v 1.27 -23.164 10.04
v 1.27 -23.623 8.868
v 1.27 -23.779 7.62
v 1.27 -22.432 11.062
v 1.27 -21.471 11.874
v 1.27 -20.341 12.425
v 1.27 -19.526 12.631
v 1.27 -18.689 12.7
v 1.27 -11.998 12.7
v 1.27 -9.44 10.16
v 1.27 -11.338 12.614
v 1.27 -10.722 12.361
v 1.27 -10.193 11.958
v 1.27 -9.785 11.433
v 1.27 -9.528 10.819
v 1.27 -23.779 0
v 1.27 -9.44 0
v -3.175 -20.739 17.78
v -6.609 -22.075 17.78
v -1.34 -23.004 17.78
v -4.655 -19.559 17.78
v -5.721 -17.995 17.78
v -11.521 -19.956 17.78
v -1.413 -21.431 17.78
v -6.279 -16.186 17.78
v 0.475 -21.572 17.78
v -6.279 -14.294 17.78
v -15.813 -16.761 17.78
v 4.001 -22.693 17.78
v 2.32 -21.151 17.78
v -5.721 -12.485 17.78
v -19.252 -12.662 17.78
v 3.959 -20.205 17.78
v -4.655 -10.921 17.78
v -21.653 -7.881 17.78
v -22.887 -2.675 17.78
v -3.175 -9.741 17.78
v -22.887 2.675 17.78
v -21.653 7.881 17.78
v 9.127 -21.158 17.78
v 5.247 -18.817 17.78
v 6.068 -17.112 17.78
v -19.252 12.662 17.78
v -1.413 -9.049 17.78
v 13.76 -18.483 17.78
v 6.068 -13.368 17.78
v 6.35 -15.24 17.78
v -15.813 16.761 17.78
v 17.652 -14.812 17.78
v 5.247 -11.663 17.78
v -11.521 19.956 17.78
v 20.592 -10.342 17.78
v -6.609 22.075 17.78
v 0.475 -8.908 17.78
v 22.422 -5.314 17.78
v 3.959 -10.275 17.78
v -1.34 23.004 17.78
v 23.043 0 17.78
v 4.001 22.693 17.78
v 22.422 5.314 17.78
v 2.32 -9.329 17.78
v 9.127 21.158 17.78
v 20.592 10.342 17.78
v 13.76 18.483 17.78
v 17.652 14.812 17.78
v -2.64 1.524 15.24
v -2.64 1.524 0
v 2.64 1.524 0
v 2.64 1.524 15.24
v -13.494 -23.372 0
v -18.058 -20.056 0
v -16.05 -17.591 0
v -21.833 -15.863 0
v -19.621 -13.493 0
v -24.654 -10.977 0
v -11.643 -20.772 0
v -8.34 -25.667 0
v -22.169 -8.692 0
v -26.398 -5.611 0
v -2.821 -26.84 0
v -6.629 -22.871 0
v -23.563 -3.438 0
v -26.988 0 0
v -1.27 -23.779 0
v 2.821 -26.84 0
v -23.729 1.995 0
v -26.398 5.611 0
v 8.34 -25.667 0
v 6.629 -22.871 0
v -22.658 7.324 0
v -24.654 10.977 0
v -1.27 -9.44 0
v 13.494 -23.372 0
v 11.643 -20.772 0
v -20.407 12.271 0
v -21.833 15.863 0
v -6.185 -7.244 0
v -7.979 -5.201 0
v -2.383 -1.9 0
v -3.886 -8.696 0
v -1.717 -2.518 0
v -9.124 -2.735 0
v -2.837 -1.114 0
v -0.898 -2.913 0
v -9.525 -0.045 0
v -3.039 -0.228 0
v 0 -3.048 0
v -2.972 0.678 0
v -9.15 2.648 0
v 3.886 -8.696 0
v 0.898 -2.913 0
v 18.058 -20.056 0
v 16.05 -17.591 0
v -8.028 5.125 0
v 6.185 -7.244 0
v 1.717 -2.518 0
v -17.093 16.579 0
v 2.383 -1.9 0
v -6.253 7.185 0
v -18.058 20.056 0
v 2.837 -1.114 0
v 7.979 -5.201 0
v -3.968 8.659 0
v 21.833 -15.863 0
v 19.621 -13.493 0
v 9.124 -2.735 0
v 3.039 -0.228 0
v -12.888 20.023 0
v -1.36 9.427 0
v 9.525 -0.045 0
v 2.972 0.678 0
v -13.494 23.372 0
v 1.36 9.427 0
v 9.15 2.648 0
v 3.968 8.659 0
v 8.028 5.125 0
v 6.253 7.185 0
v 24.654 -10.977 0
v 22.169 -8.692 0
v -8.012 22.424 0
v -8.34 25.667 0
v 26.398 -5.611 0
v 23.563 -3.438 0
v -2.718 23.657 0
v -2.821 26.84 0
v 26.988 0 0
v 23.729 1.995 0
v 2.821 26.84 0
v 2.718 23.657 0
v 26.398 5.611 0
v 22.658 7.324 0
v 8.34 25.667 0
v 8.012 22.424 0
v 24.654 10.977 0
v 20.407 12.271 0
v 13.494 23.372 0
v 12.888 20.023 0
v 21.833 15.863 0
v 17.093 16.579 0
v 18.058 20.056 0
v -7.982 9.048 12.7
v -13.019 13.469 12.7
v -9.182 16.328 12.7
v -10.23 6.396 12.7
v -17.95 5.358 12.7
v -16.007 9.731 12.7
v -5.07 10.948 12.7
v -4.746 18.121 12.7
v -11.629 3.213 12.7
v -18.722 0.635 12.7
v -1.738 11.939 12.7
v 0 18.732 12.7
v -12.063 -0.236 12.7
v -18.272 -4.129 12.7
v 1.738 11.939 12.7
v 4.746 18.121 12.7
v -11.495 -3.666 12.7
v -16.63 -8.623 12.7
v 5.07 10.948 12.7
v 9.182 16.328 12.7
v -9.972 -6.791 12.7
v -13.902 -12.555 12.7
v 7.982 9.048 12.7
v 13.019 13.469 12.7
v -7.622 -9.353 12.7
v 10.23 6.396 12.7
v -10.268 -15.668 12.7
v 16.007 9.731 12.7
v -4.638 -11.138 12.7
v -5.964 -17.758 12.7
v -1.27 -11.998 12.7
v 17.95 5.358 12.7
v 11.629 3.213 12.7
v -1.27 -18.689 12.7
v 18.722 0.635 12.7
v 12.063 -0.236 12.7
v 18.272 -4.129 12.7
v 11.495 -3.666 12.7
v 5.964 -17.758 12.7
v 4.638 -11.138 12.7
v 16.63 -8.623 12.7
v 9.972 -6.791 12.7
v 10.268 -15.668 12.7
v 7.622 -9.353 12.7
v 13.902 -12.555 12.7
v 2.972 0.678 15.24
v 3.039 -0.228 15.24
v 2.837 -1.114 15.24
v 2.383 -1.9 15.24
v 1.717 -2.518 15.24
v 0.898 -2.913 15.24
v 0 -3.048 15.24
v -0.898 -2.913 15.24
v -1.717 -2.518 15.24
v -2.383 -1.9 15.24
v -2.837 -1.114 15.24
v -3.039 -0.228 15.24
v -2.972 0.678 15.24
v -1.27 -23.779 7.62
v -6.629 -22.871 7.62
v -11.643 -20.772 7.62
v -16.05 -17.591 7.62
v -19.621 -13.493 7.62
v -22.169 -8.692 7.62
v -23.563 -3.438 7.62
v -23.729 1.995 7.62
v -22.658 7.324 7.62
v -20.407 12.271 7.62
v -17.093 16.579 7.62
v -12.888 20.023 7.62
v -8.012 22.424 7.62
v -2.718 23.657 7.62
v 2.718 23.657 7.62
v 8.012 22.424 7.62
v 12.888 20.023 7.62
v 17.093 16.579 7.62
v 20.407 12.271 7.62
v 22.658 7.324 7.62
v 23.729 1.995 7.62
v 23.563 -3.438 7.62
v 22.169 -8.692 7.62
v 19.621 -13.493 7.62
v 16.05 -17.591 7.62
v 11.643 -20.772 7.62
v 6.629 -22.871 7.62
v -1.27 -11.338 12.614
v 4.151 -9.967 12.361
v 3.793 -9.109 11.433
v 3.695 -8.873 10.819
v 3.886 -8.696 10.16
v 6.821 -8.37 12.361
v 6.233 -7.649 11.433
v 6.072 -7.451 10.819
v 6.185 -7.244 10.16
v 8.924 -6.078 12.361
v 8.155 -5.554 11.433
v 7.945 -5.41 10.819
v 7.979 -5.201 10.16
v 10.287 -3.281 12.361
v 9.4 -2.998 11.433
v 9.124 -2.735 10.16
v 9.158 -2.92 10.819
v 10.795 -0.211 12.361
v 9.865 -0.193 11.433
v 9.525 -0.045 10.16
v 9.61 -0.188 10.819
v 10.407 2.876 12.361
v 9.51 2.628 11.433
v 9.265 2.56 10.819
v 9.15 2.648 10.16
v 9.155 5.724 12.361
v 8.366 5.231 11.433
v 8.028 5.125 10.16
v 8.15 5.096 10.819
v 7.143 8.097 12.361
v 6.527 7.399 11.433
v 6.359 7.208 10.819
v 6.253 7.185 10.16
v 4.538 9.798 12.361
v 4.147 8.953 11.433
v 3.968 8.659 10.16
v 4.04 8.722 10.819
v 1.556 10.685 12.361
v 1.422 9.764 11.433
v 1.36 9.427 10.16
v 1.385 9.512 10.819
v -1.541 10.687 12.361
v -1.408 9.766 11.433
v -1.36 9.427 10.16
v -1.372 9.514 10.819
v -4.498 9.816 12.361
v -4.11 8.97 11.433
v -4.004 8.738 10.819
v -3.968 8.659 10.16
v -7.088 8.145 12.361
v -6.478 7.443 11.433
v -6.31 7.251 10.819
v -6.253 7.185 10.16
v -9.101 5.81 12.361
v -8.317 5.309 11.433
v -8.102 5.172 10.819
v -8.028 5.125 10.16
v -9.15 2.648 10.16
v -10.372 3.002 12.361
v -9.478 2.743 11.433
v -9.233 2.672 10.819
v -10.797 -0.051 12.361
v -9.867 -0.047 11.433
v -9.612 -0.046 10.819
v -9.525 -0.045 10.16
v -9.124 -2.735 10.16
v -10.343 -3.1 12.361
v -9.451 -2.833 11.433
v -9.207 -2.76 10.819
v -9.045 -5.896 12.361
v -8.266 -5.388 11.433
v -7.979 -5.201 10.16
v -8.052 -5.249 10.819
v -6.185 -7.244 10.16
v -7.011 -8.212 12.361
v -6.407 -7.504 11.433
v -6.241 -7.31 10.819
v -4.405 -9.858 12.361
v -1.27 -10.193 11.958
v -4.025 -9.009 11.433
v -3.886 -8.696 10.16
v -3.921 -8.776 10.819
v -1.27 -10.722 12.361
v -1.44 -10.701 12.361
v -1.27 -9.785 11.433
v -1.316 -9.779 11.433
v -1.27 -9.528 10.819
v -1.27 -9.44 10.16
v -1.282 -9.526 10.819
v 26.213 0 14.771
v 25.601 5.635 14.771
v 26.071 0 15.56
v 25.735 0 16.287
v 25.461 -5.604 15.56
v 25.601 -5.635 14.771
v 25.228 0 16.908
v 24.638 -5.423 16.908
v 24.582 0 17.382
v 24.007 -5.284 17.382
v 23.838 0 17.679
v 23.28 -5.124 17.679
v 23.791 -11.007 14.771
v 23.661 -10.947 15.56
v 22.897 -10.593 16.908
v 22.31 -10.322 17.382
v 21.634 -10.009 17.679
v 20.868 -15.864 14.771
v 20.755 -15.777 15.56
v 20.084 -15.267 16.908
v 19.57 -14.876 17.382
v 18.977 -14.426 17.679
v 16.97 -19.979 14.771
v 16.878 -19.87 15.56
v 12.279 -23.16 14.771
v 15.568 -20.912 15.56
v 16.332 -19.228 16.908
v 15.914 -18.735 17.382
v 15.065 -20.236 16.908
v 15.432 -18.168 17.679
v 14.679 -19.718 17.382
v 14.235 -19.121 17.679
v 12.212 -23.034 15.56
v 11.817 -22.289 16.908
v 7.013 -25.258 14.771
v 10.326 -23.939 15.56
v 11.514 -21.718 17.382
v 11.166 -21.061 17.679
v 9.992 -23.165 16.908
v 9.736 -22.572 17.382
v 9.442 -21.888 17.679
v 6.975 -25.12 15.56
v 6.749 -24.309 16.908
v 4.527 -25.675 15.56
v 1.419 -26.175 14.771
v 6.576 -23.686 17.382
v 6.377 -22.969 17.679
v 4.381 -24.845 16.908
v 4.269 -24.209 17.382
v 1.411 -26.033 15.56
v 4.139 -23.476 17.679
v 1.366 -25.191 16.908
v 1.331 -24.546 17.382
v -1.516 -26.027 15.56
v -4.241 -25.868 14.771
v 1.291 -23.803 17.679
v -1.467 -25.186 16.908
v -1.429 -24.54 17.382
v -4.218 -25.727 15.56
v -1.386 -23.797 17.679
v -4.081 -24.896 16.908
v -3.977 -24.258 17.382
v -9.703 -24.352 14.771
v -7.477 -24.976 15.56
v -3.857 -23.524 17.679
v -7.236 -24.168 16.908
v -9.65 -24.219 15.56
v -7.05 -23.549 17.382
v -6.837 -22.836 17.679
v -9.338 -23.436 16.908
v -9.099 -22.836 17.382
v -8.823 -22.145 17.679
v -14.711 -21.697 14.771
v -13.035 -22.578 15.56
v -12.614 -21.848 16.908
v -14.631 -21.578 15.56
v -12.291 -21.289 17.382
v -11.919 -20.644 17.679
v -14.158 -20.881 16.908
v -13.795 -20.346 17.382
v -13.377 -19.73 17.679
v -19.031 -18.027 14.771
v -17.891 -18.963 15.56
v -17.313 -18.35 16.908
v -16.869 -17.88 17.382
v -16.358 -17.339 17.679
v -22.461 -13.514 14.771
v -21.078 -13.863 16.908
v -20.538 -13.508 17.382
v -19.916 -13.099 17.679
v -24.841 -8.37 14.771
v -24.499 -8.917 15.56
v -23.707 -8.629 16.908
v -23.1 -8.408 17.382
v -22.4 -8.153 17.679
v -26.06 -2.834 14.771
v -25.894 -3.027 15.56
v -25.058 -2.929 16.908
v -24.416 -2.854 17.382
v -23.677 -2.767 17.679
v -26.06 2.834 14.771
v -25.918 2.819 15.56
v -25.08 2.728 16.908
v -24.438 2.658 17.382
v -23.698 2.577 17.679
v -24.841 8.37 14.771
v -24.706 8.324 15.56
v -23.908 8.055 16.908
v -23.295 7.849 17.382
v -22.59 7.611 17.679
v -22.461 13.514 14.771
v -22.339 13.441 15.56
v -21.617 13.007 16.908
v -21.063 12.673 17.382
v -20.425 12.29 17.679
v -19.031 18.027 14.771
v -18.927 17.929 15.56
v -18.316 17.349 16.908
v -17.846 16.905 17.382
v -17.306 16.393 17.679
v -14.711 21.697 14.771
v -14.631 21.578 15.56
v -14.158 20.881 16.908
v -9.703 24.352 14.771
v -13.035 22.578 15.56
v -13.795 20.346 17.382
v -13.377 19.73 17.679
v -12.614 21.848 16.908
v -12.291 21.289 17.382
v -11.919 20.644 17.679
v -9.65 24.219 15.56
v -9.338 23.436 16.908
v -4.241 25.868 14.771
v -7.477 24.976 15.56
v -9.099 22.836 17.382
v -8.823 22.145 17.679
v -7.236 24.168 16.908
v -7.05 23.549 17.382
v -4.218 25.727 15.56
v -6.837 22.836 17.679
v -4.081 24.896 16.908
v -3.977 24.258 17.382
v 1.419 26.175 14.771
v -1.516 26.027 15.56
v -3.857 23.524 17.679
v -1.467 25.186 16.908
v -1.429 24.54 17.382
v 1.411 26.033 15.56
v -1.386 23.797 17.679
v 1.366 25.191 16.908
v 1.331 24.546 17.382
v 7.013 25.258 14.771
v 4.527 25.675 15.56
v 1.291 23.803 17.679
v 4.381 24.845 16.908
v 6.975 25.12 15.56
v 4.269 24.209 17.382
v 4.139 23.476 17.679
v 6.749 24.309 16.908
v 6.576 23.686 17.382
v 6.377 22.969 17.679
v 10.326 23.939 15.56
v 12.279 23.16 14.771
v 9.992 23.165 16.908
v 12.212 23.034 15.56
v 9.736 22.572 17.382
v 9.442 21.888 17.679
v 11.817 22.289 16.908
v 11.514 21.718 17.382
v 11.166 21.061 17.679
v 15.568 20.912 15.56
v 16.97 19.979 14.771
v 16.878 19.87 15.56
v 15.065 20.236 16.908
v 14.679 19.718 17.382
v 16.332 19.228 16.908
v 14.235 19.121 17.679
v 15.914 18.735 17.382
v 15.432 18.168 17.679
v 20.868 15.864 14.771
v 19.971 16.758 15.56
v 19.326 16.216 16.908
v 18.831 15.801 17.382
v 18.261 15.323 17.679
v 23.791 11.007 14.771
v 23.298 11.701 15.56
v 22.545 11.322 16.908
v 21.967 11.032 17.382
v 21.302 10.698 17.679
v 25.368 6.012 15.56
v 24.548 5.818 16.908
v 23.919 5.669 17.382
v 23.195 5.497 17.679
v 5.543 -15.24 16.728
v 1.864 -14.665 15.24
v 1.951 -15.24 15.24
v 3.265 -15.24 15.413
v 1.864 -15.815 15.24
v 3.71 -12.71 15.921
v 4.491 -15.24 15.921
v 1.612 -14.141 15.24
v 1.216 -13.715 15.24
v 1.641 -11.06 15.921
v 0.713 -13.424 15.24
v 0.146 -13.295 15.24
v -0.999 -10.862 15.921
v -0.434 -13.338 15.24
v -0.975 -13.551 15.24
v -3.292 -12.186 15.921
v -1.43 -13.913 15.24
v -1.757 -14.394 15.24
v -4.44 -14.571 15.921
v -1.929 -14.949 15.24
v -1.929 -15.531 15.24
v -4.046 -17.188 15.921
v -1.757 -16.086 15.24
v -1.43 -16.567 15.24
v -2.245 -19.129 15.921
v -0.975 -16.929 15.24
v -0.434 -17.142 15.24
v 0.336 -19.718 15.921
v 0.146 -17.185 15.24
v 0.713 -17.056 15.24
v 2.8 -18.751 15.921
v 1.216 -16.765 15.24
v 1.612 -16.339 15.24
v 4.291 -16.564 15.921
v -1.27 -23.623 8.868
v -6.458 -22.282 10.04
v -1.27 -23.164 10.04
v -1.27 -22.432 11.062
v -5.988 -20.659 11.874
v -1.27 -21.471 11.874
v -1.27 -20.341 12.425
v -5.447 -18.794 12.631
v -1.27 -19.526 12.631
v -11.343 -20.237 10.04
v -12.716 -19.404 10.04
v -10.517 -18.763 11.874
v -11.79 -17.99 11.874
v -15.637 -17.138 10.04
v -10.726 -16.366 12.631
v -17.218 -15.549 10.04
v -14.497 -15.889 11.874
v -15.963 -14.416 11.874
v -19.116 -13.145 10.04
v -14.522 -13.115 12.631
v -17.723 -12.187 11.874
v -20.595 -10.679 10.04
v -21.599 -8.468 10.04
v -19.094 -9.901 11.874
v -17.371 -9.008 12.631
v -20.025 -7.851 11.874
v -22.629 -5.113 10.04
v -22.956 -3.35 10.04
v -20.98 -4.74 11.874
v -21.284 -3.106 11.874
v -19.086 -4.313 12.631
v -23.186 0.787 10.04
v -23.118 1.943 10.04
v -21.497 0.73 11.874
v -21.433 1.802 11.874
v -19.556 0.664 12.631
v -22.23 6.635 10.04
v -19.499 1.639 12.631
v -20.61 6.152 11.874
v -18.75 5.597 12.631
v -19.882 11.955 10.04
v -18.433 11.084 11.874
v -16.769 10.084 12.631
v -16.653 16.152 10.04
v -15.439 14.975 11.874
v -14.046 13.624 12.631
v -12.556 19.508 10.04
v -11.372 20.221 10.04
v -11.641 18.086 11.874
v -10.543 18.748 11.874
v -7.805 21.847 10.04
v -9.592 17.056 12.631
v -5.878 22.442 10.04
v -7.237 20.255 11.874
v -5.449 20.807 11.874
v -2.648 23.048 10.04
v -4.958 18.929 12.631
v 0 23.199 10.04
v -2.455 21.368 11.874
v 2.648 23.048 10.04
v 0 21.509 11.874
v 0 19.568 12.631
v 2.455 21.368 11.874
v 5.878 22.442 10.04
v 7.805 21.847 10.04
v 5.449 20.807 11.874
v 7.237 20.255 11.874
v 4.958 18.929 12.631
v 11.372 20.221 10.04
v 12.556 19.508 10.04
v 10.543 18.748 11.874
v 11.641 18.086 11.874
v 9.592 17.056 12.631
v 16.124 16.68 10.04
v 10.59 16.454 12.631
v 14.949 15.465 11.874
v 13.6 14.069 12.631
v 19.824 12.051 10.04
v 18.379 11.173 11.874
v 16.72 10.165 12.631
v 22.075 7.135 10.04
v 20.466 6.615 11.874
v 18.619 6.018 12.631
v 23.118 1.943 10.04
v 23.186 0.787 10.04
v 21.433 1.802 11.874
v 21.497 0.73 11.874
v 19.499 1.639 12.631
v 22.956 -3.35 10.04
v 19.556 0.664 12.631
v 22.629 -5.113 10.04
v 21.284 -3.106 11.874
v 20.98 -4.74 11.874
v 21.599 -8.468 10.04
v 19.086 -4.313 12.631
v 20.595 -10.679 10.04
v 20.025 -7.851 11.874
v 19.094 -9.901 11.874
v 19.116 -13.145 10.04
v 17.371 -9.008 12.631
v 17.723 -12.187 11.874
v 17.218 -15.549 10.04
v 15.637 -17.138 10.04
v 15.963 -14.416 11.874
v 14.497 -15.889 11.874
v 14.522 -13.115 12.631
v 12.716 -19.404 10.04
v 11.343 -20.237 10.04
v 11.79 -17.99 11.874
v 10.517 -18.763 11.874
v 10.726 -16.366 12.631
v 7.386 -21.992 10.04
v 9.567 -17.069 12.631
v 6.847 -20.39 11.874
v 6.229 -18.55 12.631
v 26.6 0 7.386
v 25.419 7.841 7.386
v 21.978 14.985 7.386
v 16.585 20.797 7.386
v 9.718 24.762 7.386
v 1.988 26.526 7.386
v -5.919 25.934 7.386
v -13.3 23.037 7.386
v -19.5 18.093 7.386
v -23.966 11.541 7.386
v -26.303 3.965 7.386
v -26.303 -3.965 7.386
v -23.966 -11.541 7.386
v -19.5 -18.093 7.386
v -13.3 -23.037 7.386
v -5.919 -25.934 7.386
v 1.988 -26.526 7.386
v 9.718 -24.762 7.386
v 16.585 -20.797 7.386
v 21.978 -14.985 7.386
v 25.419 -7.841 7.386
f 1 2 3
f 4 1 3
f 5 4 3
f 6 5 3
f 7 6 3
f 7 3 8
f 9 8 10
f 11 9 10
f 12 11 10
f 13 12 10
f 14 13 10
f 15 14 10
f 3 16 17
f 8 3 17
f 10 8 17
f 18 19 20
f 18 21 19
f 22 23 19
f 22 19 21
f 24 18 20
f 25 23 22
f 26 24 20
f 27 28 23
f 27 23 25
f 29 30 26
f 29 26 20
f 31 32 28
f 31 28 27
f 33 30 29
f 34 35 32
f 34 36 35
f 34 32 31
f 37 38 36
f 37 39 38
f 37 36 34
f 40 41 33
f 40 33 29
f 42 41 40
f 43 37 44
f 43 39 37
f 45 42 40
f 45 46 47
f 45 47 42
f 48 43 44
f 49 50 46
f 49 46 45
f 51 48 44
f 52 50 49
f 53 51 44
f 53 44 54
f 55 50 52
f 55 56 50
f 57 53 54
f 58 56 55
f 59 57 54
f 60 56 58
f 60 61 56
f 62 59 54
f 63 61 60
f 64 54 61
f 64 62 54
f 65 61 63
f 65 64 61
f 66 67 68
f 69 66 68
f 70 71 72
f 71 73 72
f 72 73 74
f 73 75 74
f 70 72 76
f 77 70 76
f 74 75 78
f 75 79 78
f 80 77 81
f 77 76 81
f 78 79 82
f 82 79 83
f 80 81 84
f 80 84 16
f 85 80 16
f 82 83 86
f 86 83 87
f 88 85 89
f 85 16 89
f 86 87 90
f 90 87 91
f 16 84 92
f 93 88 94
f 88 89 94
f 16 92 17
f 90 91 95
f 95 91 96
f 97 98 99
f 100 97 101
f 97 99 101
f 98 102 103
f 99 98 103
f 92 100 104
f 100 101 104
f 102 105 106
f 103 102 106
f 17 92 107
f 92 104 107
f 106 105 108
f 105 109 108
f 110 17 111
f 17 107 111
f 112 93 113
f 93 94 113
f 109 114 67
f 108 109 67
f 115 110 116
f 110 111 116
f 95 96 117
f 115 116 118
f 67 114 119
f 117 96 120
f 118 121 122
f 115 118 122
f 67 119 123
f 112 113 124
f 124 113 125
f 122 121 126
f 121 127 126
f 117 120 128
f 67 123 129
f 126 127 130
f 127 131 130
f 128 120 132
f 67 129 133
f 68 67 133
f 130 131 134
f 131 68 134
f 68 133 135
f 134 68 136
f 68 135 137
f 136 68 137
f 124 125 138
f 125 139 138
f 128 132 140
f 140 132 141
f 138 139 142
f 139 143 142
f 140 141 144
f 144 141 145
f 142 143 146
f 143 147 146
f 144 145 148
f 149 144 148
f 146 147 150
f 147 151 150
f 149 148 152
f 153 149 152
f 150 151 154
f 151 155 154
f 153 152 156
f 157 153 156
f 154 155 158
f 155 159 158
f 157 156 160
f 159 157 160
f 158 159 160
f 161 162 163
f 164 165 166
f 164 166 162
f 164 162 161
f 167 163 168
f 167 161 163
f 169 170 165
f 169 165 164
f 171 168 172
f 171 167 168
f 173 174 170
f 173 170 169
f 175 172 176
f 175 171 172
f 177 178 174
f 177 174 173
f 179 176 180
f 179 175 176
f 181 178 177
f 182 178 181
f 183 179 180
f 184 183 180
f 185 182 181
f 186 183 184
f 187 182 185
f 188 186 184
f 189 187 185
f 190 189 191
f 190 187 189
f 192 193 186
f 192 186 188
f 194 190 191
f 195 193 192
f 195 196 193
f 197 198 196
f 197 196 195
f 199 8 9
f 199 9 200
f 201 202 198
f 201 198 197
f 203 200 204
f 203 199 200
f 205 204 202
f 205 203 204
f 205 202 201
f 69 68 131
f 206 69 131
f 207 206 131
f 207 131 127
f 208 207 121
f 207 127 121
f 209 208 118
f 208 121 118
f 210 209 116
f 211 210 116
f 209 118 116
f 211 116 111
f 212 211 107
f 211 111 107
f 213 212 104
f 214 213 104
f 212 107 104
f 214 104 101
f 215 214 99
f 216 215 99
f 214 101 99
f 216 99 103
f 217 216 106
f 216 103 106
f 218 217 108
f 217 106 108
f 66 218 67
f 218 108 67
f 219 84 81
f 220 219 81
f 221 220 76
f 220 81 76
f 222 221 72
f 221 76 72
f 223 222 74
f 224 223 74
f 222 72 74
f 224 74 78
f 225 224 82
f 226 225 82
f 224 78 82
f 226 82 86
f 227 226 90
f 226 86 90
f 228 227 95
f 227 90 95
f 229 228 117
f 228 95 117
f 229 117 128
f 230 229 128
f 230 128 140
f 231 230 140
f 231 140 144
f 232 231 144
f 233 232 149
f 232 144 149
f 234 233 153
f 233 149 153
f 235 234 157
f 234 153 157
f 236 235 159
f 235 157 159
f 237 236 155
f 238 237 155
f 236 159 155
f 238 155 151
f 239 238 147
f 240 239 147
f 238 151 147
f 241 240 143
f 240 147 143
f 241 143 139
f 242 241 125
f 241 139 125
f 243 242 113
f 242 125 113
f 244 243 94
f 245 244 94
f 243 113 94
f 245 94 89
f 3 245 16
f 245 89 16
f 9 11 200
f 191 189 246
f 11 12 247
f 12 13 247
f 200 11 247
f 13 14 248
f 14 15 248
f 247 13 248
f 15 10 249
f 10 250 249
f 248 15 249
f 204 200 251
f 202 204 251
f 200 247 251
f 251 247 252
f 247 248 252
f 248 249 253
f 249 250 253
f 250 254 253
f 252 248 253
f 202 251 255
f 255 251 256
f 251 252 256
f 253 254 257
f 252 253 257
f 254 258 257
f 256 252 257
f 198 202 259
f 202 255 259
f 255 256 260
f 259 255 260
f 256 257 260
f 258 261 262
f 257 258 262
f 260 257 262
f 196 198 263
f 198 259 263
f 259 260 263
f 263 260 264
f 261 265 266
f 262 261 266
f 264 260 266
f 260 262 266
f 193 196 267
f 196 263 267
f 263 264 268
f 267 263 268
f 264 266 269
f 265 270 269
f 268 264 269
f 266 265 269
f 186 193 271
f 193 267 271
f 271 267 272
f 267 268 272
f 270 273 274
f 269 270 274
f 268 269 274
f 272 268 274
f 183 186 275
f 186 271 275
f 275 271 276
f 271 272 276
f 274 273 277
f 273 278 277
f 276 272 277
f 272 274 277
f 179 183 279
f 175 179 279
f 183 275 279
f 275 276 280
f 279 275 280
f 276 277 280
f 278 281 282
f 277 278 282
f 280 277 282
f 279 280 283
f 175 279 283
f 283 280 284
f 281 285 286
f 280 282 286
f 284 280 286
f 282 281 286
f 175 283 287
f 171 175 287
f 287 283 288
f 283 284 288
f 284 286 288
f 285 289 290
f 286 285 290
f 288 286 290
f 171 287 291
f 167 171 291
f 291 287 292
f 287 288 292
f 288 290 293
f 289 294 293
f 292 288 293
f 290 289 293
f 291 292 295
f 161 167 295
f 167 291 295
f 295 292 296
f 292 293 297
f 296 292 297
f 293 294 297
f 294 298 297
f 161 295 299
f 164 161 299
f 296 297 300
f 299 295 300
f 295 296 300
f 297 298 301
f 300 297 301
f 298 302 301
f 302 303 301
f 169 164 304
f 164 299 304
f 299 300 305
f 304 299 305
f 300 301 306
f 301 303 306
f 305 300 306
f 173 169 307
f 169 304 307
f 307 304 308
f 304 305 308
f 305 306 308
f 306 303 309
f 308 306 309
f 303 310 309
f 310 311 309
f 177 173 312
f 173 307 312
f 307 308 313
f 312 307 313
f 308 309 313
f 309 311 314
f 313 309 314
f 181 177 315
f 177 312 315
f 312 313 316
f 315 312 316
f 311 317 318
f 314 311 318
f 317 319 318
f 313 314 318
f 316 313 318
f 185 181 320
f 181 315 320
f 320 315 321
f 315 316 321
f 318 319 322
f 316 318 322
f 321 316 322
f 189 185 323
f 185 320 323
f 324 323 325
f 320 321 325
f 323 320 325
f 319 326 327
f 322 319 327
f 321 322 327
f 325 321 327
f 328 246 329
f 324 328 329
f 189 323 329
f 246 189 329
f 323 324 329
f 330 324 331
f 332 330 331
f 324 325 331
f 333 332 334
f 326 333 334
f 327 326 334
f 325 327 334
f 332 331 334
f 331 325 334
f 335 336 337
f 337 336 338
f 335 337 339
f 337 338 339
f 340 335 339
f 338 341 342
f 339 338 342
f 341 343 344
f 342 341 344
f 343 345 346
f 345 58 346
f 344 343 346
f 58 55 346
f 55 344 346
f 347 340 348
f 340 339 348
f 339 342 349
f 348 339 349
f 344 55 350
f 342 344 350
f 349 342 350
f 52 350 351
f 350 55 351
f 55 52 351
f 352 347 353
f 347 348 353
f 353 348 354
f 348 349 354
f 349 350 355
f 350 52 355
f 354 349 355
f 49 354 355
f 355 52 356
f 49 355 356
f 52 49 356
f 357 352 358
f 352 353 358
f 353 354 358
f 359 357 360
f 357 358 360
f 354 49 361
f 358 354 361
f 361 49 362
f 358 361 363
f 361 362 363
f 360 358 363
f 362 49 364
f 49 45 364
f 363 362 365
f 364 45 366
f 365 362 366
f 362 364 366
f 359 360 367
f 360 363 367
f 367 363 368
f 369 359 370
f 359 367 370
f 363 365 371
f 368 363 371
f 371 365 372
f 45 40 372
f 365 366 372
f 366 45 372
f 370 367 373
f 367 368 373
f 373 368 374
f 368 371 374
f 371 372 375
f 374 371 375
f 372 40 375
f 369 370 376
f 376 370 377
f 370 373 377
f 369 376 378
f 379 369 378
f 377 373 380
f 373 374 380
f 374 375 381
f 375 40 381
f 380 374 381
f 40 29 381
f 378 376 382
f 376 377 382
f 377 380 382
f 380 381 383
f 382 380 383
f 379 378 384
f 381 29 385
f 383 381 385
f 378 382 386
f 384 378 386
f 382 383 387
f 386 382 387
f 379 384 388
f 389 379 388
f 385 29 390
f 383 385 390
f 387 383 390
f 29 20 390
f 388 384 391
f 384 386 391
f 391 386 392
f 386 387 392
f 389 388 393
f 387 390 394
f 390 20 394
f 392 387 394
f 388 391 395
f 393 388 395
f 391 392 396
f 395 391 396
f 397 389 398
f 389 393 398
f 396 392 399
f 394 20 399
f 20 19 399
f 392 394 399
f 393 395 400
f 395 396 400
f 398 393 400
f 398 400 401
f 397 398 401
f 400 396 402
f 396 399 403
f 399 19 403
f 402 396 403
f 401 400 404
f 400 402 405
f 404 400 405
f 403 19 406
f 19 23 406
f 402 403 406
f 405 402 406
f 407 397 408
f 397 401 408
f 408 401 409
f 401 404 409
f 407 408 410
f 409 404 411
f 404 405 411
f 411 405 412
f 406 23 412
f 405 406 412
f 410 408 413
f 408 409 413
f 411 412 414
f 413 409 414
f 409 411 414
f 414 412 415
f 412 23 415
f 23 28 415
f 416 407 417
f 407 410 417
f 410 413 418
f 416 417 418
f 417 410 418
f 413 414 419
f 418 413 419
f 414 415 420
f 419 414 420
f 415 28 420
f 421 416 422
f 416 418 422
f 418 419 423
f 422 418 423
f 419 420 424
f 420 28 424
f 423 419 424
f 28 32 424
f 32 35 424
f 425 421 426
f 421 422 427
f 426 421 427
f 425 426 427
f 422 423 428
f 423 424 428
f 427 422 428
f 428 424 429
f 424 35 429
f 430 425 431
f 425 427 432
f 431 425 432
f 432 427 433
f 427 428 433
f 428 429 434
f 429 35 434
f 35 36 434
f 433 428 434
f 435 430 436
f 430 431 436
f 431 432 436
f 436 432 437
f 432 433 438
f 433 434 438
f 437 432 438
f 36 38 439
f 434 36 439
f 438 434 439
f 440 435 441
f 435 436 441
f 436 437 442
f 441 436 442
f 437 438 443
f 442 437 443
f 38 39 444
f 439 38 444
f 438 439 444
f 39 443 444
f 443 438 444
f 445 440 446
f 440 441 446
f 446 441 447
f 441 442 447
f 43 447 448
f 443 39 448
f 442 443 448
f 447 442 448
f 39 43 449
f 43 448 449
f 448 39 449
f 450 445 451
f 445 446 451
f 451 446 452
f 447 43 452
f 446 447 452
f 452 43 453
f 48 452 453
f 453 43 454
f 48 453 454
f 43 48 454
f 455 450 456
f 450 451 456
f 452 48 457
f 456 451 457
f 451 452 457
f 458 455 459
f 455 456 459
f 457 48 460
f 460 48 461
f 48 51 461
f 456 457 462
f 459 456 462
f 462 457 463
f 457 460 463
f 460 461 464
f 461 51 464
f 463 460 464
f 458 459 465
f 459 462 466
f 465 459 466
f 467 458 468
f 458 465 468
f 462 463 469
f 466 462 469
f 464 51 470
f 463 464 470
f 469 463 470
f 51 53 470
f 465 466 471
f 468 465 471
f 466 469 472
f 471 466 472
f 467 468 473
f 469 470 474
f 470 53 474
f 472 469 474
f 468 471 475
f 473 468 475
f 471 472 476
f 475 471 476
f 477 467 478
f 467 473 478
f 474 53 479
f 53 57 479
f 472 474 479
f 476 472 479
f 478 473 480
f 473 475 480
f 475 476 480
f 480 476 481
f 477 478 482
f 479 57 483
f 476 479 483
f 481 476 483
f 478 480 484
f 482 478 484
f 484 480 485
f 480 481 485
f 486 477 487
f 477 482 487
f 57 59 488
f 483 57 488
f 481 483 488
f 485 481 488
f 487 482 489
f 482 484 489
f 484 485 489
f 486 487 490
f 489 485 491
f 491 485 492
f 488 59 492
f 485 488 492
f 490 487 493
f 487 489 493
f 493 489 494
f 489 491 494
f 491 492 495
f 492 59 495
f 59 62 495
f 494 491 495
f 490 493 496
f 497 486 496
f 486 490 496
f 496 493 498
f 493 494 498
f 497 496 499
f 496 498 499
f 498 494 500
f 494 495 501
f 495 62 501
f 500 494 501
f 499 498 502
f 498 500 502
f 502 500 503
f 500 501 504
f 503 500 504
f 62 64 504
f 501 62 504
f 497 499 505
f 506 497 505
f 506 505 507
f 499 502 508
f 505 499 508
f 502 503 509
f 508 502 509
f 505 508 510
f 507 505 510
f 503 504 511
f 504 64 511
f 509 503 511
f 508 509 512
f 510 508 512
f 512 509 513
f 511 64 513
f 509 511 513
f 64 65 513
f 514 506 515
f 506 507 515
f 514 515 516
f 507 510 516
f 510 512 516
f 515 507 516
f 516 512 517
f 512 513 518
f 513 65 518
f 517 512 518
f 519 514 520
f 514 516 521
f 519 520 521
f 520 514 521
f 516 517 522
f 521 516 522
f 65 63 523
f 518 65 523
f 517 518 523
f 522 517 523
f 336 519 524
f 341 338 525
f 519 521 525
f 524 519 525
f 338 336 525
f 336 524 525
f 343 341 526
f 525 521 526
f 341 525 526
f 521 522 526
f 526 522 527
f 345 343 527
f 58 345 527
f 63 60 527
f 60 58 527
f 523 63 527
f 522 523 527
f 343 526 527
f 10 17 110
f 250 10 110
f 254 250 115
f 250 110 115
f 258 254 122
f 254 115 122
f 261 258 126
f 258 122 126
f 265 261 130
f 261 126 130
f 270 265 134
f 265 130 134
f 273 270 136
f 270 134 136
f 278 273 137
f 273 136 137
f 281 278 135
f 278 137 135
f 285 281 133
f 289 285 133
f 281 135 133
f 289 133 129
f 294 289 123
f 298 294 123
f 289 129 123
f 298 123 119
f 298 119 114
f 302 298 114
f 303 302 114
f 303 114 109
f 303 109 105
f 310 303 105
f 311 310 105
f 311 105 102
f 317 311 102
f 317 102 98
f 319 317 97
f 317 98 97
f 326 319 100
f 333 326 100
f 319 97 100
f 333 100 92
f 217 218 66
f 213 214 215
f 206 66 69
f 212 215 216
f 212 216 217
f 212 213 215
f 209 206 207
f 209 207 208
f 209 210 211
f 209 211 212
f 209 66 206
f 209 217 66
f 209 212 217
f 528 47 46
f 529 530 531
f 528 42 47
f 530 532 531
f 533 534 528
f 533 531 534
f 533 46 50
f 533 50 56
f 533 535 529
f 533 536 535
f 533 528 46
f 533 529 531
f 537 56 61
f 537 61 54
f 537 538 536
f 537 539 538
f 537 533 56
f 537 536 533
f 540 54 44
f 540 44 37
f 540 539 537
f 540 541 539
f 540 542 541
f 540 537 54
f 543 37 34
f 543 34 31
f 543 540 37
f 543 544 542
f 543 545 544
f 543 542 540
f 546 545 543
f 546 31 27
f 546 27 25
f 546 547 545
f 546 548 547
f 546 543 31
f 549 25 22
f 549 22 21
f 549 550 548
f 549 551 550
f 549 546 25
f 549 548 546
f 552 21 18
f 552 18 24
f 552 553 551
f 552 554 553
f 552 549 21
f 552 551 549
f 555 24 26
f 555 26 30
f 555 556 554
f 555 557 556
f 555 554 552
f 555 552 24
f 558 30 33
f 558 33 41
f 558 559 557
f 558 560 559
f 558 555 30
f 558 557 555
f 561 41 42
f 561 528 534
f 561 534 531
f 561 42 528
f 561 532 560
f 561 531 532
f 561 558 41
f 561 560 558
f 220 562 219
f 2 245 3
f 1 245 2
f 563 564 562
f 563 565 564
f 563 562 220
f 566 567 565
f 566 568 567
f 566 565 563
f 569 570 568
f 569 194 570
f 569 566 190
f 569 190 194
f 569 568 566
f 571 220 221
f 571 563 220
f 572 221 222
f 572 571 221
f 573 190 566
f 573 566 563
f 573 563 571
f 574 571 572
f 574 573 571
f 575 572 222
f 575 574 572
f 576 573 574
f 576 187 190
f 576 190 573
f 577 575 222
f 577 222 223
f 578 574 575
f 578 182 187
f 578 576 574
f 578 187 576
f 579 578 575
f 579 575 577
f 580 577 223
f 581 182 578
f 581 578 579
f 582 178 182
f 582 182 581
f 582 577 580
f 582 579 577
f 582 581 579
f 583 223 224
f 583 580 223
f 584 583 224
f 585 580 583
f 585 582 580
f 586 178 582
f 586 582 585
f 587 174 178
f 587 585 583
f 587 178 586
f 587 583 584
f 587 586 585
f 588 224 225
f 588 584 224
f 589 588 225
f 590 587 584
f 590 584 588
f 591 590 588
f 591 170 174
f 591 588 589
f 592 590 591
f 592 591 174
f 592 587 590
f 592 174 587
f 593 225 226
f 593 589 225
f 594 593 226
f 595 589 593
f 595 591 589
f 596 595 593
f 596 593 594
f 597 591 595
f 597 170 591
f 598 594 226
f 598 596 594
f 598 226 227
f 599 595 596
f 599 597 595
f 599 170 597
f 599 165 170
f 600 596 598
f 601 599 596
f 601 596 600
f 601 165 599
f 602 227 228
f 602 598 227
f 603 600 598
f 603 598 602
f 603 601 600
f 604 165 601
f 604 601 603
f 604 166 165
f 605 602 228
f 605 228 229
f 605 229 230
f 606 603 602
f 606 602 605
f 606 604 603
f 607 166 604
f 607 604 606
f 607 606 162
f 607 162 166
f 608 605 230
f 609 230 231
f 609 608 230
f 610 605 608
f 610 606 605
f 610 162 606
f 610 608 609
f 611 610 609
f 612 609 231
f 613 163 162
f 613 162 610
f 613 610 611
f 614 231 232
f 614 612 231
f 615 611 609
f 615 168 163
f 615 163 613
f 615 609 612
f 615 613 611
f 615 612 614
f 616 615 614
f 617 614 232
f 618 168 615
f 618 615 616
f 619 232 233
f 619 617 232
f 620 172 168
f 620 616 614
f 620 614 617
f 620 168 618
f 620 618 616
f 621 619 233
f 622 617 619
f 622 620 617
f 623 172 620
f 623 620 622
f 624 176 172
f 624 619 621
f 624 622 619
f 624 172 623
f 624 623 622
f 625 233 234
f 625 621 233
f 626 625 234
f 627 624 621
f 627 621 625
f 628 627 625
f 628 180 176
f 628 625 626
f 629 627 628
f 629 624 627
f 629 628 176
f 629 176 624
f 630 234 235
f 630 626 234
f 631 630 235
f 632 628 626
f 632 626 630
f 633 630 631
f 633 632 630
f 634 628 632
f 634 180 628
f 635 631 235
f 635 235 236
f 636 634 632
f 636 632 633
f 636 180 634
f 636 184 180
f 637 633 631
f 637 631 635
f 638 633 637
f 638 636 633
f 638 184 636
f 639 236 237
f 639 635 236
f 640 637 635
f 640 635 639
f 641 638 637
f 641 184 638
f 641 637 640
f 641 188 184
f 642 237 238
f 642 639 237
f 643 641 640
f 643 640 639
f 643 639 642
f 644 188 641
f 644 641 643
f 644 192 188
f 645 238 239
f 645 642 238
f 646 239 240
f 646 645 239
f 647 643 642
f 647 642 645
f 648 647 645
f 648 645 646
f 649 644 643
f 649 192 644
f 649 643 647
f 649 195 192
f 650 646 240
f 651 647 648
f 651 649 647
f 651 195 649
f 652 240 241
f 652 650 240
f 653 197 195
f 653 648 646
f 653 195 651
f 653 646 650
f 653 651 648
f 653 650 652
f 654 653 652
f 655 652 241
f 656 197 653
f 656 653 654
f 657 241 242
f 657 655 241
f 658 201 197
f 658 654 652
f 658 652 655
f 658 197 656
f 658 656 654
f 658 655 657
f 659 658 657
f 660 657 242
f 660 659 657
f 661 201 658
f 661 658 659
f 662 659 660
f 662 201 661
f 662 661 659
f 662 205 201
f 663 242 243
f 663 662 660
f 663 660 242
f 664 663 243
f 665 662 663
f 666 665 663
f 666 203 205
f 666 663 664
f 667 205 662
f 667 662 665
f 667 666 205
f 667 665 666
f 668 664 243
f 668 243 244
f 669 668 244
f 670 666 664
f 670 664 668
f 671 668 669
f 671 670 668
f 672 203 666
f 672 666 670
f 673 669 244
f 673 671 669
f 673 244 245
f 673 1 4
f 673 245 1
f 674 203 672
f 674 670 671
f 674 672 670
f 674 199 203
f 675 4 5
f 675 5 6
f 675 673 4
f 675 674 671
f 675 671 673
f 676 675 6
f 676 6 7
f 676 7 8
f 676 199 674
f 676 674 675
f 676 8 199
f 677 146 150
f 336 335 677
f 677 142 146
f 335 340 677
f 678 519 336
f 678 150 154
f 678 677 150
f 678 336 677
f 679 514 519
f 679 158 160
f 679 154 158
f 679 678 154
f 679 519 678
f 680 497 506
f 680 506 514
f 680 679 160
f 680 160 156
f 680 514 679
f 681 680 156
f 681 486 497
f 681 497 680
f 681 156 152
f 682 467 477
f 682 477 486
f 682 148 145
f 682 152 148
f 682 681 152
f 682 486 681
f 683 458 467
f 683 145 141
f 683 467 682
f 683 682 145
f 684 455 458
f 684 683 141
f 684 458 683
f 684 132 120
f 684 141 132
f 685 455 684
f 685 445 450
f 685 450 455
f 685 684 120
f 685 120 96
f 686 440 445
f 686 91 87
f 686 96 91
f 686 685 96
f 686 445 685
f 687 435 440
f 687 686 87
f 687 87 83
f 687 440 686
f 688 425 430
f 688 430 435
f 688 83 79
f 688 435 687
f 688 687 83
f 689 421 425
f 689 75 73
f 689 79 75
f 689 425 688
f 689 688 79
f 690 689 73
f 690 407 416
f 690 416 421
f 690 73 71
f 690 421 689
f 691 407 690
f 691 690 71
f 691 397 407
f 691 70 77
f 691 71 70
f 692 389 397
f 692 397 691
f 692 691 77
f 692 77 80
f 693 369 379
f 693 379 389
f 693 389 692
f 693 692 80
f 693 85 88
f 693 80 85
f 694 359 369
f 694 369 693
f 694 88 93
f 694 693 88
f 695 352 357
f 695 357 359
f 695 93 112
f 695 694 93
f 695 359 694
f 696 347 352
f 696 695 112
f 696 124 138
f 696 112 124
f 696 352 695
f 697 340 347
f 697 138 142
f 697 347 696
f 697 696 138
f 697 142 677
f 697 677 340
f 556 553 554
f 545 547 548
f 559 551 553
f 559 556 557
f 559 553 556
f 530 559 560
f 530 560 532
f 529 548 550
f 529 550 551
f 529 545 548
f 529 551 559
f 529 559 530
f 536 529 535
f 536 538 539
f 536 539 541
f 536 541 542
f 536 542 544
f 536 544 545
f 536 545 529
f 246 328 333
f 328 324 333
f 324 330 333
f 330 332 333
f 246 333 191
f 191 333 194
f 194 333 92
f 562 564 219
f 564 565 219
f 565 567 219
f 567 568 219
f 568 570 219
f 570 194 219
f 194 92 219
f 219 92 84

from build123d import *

# Parameters (mm, degrees)
F0_R      = 26.9875
F1_DEPTH  = 17.78
F1_TAPER  = 3
F2_R      = 3.175
F3_R      = 6.35
F4_DEPTH  = 2.54
F7_DEPTH  = 12.7
F8_R      = 5.08
F9_R      = 2.54
F11_DEPTH = 15.24


# Not quite as in the source:
# - a fillet or chamfer that OpenCascade refuses, or shapes differently, is made with other operations: its cross-section is extruded or revolved along the edge and cut away or added


with BuildPart() as f1:
    # F0 (on Top) → F1 (new body)
    with BuildSketch(Plane.XY):
        Circle(F0_R)
    extrude(amount=F1_DEPTH, taper=F1_TAPER)

    # F2
    f2_edges = [f1.edges().sort_by_distance(p)[0] for p in [
        (-26.05569, 0, 17.78),
    ]]
    fillet(f2_edges, radius=F2_R)

    # F3 (on face) → F4 (cut)
    with BuildSketch(Plane.XY.offset(17.78)):
        with Locations((0, -15.24)):
            Circle(F3_R)
    extrude(amount=-F4_DEPTH, mode=Mode.SUBTRACT)

    # F5: fillet of radius 5.08 on 1 edges, made by hand

    # F5_s1 → F5_t2 (revolve)
    with BuildSketch(Plane.XZ.offset(15.24)):
        with BuildLine():
            ThreePointArc((6.35, 17.78), (4.4905909488, 15.9205909488), (1.9505909488, 15.24))
            Line((1.9505909488, 15.24), (6.35, 15.24))
            Line((6.35, 15.24), (6.35, 17.78))
        make_face()
    revolve(axis=Axis((0, -15.24, 15.24), (0, 0, 1)))

    # F6 (on face) → F7 (cut)
    with BuildSketch(Plane(origin=(0, 0, 0), x_dir=(1, 0, 0), z_dir=(0, 0, -1))):
        with BuildLine():
            ThreePointArc((1.27, 9.4399536545), (0, -9.525), (-1.27, 9.4399536545))
            Line((-1.27, 9.4399536545), (-1.27, 23.7786092161))
            ThreePointArc((-1.27, 23.7786092161), (0, -23.8125), (1.27, 23.7786092161))
            Line((1.27, 23.7786092161), (1.27, 9.4399536545))
        make_face()
    extrude(amount=-F7_DEPTH, mode=Mode.SUBTRACT)

    # F8
    f8_edges = [f1.edges().sort_by_distance(p)[0] for p in [
        (0, 23.8125, 12.7),
    ]]
    fillet(f8_edges, radius=F8_R)

    # F9
    f9_edges = [f1.edges().sort_by_distance(p)[0] for p in [
        (0, 9.525, 12.7),
    ]]
    fillet(f9_edges, radius=F9_R)

    # F10 (on face) → F11 (cut)
    with BuildSketch(Plane(origin=(0, 0, 0), x_dir=(1, 0, 0), z_dir=(0, 0, -1))):
        with BuildLine():
            Line((-2.6396454307, -1.524), (2.6396454307, -1.524))
            ThreePointArc((2.6396454307, -1.524), (0, 3.048), (-2.6396454307, -1.524))
        make_face()
    extrude(amount=-F11_DEPTH, mode=Mode.SUBTRACT)


solid = f1.part
